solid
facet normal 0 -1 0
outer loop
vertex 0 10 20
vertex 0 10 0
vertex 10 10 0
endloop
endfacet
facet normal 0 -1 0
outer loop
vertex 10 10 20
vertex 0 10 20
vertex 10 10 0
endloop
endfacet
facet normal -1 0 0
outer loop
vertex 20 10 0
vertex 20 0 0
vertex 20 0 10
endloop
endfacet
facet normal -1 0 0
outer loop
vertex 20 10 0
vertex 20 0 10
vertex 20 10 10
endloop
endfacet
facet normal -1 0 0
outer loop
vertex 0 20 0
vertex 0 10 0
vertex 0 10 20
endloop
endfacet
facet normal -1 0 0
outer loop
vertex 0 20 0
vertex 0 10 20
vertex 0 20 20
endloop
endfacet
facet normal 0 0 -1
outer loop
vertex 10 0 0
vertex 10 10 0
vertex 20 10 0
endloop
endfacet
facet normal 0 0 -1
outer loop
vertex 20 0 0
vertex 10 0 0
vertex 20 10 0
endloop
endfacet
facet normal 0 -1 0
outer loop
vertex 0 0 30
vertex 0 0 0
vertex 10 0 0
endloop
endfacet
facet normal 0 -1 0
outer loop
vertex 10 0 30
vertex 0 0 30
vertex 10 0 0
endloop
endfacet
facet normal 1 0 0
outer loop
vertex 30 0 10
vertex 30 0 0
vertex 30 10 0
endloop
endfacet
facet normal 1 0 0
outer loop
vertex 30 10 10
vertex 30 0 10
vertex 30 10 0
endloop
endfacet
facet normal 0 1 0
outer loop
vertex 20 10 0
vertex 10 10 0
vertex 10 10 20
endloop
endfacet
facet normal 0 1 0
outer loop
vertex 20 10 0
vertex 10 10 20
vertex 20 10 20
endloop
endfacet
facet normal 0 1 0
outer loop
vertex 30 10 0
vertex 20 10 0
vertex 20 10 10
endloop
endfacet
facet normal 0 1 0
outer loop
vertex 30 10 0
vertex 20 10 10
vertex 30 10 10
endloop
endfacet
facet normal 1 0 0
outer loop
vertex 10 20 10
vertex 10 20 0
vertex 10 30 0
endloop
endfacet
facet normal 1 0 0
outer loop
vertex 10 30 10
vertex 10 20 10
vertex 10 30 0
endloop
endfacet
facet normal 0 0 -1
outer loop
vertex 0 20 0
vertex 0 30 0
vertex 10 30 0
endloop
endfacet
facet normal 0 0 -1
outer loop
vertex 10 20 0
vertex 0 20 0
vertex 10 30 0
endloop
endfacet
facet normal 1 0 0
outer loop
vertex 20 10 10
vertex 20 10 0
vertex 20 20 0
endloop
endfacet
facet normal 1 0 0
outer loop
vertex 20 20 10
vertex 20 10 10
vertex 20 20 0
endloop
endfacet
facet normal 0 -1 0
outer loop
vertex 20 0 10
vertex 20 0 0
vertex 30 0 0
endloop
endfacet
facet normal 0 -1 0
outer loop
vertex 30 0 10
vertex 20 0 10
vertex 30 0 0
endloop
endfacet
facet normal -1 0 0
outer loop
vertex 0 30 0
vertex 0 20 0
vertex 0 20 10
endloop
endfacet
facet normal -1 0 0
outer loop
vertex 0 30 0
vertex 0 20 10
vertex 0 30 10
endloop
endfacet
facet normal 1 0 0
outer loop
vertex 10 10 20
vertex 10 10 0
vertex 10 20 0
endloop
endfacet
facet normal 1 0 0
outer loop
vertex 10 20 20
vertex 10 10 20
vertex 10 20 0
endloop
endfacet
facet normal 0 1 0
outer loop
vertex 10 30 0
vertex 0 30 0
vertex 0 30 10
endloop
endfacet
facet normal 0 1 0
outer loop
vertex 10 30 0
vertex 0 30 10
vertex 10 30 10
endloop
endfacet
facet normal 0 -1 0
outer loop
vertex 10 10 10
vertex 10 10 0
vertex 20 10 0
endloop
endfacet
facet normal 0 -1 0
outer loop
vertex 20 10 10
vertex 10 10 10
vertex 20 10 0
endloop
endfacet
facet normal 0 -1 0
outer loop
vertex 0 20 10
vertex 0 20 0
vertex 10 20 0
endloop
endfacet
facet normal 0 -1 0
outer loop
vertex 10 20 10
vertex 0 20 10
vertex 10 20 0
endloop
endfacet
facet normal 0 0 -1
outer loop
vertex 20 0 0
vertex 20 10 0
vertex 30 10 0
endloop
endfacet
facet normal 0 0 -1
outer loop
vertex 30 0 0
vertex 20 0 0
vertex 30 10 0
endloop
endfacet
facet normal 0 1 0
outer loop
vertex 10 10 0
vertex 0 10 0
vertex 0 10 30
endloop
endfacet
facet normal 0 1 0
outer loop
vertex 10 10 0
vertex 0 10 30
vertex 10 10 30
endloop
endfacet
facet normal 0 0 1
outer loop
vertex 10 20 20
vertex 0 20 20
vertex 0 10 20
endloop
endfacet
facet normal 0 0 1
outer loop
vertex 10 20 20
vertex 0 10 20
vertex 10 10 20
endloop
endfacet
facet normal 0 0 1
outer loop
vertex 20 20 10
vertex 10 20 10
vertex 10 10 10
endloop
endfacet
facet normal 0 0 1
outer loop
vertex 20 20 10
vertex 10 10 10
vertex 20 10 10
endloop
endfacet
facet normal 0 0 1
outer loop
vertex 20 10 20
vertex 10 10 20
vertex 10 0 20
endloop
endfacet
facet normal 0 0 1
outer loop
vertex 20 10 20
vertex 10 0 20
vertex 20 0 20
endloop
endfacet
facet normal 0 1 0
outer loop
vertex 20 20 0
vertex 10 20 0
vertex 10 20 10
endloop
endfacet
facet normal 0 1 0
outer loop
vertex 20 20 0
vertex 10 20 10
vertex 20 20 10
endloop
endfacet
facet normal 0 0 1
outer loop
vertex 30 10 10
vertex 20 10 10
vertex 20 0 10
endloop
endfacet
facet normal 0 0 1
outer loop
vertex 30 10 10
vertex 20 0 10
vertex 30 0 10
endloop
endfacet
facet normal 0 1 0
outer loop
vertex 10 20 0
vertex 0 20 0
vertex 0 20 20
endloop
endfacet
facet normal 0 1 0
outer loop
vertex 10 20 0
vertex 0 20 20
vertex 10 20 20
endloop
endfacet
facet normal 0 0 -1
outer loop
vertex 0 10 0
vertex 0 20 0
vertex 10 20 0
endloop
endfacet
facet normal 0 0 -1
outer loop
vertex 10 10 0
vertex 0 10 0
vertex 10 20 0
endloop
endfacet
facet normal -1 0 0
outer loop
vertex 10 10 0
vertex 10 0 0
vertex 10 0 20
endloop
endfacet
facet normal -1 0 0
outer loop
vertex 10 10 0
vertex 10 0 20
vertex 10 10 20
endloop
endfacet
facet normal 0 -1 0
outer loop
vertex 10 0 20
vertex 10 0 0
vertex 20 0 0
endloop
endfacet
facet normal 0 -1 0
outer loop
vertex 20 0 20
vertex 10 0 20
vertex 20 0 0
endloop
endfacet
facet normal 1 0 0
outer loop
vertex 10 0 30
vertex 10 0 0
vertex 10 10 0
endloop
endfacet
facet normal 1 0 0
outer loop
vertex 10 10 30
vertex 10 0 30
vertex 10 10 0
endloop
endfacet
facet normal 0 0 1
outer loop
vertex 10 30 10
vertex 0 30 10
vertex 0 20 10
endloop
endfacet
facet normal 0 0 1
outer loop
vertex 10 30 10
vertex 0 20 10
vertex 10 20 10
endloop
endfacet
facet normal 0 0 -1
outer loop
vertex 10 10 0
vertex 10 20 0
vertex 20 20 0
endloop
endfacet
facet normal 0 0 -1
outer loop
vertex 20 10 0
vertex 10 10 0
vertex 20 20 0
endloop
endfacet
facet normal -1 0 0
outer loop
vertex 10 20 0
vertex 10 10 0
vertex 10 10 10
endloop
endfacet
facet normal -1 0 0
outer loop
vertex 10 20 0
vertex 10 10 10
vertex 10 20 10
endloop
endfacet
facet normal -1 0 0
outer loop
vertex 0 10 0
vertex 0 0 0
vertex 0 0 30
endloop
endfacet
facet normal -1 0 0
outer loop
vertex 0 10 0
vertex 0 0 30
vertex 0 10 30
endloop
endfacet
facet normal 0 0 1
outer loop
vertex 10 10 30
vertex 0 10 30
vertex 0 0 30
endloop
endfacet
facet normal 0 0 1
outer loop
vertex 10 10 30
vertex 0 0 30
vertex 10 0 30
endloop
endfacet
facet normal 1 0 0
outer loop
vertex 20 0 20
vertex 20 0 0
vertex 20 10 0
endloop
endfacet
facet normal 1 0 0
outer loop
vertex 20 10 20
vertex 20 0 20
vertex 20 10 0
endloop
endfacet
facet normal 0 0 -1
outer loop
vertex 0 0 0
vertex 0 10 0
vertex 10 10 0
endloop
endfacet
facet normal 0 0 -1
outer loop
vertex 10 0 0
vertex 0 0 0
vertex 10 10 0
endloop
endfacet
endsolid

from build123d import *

# Parameters (mm, degrees)
BOX_W        = 10
BOX_H        = 10
BOX_DEPTH    = 30
BOX001_W     = 10
BOX001_H     = 10
BOX001_DEPTH = 20
BOX002_W     = 10
BOX002_H     = 10
BOX002_DEPTH = 20
BOX004_W     = 10
BOX004_H     = 10
BOX004_DEPTH = 10
BOX005_W     = 10
BOX005_H     = 10
BOX005_DEPTH = 10
BOX006_W     = 10
BOX006_H     = 10
BOX006_DEPTH = 10


with BuildPart() as cubo:
    # Box → Box (new body)
    with BuildSketch(Plane.XY):
        with Locations((5, 5)):
            Rectangle(BOX_W, BOX_H)
    extrude(amount=BOX_DEPTH)


with BuildPart() as cubo001:
    # Box001 → Box001 (new body)
    with BuildSketch(Plane(origin=(0, 10, 0), x_dir=(1, 0, 0), z_dir=(0, 0, 1))):
        with Locations((5, 5)):
            Rectangle(BOX001_W, BOX001_H)
    extrude(amount=BOX001_DEPTH)


with BuildPart() as cubo002:
    # Box002 → Box002 (new body)
    with BuildSketch(Plane(origin=(10, 0, 0), x_dir=(1, 0, 0), z_dir=(0, 0, 1))):
        with Locations((5, 5)):
            Rectangle(BOX002_W, BOX002_H)
    extrude(amount=BOX002_DEPTH)


with BuildPart() as cubo004:
    # Box004 → Box004 (new body)
    with BuildSketch(Plane(origin=(10, 10, 0), x_dir=(1, 0, 0), z_dir=(0, 0, 1))):
        with Locations((5, 5)):
            Rectangle(BOX004_W, BOX004_H)
    extrude(amount=BOX004_DEPTH)


with BuildPart() as cubo005:
    # Box005 → Box005 (new body)
    with BuildSketch(Plane(origin=(20, 0, 0), x_dir=(1, 0, 0), z_dir=(0, 0, 1))):
        with Locations((5, 5)):
            Rectangle(BOX005_W, BOX005_H)
    extrude(amount=BOX005_DEPTH)


with BuildPart() as cubo006:
    # Box006 → Box006 (new body)
    with BuildSketch(Plane(origin=(0, 20, 0), x_dir=(1, 0, 0), z_dir=(0, 0, 1))):
        with Locations((5, 5)):
            Rectangle(BOX006_W, BOX006_H)
    extrude(amount=BOX006_DEPTH)


solid = Compound([cubo.part, cubo001.part, cubo002.part, cubo004.part, cubo005.part, cubo006.part])
